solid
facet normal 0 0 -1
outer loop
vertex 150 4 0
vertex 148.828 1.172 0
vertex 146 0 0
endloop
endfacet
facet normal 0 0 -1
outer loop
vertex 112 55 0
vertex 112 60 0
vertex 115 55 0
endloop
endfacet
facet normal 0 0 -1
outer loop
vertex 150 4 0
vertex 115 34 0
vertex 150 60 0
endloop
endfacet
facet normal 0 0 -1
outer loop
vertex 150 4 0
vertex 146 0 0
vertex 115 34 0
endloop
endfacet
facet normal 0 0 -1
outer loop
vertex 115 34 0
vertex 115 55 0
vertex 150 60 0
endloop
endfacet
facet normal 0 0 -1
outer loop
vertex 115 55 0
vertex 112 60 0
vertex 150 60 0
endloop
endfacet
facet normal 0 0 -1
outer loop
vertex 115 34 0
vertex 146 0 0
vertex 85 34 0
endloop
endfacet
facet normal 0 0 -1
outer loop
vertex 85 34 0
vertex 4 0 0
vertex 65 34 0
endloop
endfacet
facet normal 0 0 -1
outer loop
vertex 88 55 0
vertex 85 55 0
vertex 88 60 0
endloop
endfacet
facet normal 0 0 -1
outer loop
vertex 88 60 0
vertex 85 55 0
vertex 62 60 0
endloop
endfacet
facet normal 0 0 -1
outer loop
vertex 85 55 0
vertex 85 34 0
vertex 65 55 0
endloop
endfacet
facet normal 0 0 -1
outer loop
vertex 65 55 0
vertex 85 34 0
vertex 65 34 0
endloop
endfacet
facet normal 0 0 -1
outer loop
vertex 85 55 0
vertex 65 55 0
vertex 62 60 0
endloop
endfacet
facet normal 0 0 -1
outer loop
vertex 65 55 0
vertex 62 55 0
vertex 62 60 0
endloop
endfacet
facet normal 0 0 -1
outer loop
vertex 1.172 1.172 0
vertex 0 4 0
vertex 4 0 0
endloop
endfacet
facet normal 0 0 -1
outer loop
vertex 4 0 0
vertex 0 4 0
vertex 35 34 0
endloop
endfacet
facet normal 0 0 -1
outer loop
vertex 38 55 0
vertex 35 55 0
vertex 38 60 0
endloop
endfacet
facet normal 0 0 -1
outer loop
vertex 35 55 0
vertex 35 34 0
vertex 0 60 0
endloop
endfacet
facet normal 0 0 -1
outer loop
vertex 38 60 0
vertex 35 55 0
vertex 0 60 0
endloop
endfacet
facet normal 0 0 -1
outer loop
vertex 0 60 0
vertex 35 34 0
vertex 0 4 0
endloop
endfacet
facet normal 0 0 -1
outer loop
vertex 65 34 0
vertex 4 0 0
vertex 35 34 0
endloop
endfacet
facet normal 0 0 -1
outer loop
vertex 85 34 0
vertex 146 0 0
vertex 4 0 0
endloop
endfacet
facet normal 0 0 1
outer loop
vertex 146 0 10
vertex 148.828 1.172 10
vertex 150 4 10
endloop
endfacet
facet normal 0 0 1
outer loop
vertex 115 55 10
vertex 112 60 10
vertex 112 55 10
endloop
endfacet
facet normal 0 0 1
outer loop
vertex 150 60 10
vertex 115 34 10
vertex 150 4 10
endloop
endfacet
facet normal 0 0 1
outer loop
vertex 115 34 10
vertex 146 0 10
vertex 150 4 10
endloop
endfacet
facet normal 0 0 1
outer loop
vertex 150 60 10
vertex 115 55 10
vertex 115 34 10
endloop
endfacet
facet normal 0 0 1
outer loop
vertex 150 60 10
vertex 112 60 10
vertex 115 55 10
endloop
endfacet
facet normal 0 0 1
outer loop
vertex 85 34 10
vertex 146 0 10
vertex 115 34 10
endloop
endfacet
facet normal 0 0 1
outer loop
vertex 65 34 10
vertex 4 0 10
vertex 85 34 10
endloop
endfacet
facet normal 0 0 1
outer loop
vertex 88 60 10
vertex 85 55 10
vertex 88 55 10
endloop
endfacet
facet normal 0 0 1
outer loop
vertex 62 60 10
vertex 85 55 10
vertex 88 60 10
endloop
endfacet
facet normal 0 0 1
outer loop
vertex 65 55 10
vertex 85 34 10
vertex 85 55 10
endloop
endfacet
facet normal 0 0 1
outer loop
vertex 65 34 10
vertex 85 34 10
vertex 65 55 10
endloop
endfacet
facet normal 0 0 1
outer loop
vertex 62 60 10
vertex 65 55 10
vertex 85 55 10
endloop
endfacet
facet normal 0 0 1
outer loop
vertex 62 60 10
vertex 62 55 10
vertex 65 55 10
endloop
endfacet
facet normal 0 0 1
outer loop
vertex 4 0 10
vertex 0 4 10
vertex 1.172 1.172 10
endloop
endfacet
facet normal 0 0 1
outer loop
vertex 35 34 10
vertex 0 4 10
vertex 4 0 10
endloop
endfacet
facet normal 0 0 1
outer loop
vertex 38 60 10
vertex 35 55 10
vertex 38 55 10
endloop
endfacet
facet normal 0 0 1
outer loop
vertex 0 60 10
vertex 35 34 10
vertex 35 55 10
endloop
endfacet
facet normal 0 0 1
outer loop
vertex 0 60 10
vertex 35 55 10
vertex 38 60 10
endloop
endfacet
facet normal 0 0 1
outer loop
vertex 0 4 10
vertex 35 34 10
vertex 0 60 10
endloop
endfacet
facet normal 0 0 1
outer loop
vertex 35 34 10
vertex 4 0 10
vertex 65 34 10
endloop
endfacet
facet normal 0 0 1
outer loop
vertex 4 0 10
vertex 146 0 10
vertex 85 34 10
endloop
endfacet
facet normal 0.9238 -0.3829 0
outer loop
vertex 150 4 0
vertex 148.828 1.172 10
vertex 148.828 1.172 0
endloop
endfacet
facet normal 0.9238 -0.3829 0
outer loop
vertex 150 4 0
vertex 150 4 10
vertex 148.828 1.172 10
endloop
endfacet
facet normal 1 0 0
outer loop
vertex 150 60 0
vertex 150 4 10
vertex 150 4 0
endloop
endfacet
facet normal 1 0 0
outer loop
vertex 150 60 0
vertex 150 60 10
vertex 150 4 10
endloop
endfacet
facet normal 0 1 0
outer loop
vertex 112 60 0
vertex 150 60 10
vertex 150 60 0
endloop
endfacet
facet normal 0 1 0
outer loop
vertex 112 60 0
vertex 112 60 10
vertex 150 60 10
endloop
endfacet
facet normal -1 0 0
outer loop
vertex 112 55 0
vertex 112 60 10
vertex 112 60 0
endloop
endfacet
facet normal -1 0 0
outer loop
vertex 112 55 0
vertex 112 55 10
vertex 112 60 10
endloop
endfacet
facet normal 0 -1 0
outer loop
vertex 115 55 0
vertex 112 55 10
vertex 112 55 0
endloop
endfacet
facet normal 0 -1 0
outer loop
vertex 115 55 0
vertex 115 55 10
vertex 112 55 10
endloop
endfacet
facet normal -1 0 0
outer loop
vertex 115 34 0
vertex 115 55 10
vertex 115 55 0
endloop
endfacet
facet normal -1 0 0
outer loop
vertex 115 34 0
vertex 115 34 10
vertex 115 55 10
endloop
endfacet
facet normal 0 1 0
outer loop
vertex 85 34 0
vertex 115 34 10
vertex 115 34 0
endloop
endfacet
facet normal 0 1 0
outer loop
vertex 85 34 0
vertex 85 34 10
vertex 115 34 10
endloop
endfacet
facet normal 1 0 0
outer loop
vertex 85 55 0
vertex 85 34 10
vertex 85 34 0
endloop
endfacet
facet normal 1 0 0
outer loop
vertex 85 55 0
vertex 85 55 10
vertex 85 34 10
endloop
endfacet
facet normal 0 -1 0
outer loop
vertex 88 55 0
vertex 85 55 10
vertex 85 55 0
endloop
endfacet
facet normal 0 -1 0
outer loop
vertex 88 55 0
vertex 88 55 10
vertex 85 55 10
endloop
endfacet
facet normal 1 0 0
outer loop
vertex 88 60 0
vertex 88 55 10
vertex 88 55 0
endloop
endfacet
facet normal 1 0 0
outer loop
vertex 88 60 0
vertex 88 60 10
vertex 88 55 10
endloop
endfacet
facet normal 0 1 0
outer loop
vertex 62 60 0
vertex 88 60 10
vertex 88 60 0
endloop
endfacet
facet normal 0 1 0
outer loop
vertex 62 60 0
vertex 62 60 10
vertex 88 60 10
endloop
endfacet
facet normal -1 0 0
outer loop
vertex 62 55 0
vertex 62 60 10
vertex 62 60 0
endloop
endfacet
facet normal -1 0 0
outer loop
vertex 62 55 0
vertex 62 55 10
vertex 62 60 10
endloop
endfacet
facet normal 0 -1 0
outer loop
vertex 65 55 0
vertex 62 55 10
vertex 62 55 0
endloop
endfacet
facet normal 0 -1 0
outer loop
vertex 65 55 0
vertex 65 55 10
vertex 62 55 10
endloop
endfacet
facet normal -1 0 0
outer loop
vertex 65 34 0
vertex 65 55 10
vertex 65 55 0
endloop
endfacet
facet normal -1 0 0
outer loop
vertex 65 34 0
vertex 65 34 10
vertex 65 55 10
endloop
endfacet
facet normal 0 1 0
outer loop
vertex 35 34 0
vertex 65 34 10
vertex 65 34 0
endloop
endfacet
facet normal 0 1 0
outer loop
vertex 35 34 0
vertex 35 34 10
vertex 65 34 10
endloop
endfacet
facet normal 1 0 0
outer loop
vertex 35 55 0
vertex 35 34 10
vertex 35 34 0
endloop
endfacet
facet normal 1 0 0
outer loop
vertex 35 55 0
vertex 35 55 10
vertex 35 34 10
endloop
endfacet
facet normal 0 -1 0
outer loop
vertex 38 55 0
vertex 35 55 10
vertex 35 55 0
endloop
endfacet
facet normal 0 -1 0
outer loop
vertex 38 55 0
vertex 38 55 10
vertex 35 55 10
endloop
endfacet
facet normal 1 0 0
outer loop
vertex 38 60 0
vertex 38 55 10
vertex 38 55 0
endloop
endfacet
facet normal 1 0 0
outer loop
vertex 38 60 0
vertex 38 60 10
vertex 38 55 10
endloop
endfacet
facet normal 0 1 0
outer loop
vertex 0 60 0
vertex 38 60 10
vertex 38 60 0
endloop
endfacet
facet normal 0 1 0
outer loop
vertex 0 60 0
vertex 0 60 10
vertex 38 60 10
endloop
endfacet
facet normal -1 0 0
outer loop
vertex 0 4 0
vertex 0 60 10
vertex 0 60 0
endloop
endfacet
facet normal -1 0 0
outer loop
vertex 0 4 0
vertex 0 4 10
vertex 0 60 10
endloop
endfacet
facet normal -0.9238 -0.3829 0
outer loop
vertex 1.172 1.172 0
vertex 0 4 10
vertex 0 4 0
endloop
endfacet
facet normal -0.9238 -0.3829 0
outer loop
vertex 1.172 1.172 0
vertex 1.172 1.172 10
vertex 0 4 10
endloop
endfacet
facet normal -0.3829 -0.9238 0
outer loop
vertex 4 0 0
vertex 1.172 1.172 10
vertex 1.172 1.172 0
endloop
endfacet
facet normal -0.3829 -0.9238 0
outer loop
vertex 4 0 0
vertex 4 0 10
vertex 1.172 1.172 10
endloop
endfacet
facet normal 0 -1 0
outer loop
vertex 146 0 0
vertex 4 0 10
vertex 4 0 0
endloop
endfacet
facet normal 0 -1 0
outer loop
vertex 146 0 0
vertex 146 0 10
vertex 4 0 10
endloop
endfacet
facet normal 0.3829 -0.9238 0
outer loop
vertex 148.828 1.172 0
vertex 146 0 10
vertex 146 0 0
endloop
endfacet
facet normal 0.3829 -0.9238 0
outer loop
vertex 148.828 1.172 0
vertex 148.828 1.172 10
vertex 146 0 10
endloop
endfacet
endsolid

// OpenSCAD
$fn = 32;

// ----------------------------------------------------------------------
// Oversize slot bar: 150 mm bar with 2 oversize windows
// ----------------------------------------------------------------------

// --- parameters (mm) ---
profile_height = 10;      // extrusion height
profile_points = 24;      // points of the closed outline

profile = [[0, 4], [1.172, 1.172], [4, 0], [146, 0], [148.828, 1.172], [150, 4], [150, 60], [112, 60], [112, 55], [115, 55], [115, 34], [85, 34], [85, 55], [88, 55], [88, 60], [62, 60], [62, 55], [65, 55], [65, 34], [35, 34], [35, 55], [38, 55], [38, 60], [0, 60]];  // single closed polygon, 24 points, counter clockwise

// --- the one profile operation ---
linear_extrude(height = profile_height) polygon(points = profile);
